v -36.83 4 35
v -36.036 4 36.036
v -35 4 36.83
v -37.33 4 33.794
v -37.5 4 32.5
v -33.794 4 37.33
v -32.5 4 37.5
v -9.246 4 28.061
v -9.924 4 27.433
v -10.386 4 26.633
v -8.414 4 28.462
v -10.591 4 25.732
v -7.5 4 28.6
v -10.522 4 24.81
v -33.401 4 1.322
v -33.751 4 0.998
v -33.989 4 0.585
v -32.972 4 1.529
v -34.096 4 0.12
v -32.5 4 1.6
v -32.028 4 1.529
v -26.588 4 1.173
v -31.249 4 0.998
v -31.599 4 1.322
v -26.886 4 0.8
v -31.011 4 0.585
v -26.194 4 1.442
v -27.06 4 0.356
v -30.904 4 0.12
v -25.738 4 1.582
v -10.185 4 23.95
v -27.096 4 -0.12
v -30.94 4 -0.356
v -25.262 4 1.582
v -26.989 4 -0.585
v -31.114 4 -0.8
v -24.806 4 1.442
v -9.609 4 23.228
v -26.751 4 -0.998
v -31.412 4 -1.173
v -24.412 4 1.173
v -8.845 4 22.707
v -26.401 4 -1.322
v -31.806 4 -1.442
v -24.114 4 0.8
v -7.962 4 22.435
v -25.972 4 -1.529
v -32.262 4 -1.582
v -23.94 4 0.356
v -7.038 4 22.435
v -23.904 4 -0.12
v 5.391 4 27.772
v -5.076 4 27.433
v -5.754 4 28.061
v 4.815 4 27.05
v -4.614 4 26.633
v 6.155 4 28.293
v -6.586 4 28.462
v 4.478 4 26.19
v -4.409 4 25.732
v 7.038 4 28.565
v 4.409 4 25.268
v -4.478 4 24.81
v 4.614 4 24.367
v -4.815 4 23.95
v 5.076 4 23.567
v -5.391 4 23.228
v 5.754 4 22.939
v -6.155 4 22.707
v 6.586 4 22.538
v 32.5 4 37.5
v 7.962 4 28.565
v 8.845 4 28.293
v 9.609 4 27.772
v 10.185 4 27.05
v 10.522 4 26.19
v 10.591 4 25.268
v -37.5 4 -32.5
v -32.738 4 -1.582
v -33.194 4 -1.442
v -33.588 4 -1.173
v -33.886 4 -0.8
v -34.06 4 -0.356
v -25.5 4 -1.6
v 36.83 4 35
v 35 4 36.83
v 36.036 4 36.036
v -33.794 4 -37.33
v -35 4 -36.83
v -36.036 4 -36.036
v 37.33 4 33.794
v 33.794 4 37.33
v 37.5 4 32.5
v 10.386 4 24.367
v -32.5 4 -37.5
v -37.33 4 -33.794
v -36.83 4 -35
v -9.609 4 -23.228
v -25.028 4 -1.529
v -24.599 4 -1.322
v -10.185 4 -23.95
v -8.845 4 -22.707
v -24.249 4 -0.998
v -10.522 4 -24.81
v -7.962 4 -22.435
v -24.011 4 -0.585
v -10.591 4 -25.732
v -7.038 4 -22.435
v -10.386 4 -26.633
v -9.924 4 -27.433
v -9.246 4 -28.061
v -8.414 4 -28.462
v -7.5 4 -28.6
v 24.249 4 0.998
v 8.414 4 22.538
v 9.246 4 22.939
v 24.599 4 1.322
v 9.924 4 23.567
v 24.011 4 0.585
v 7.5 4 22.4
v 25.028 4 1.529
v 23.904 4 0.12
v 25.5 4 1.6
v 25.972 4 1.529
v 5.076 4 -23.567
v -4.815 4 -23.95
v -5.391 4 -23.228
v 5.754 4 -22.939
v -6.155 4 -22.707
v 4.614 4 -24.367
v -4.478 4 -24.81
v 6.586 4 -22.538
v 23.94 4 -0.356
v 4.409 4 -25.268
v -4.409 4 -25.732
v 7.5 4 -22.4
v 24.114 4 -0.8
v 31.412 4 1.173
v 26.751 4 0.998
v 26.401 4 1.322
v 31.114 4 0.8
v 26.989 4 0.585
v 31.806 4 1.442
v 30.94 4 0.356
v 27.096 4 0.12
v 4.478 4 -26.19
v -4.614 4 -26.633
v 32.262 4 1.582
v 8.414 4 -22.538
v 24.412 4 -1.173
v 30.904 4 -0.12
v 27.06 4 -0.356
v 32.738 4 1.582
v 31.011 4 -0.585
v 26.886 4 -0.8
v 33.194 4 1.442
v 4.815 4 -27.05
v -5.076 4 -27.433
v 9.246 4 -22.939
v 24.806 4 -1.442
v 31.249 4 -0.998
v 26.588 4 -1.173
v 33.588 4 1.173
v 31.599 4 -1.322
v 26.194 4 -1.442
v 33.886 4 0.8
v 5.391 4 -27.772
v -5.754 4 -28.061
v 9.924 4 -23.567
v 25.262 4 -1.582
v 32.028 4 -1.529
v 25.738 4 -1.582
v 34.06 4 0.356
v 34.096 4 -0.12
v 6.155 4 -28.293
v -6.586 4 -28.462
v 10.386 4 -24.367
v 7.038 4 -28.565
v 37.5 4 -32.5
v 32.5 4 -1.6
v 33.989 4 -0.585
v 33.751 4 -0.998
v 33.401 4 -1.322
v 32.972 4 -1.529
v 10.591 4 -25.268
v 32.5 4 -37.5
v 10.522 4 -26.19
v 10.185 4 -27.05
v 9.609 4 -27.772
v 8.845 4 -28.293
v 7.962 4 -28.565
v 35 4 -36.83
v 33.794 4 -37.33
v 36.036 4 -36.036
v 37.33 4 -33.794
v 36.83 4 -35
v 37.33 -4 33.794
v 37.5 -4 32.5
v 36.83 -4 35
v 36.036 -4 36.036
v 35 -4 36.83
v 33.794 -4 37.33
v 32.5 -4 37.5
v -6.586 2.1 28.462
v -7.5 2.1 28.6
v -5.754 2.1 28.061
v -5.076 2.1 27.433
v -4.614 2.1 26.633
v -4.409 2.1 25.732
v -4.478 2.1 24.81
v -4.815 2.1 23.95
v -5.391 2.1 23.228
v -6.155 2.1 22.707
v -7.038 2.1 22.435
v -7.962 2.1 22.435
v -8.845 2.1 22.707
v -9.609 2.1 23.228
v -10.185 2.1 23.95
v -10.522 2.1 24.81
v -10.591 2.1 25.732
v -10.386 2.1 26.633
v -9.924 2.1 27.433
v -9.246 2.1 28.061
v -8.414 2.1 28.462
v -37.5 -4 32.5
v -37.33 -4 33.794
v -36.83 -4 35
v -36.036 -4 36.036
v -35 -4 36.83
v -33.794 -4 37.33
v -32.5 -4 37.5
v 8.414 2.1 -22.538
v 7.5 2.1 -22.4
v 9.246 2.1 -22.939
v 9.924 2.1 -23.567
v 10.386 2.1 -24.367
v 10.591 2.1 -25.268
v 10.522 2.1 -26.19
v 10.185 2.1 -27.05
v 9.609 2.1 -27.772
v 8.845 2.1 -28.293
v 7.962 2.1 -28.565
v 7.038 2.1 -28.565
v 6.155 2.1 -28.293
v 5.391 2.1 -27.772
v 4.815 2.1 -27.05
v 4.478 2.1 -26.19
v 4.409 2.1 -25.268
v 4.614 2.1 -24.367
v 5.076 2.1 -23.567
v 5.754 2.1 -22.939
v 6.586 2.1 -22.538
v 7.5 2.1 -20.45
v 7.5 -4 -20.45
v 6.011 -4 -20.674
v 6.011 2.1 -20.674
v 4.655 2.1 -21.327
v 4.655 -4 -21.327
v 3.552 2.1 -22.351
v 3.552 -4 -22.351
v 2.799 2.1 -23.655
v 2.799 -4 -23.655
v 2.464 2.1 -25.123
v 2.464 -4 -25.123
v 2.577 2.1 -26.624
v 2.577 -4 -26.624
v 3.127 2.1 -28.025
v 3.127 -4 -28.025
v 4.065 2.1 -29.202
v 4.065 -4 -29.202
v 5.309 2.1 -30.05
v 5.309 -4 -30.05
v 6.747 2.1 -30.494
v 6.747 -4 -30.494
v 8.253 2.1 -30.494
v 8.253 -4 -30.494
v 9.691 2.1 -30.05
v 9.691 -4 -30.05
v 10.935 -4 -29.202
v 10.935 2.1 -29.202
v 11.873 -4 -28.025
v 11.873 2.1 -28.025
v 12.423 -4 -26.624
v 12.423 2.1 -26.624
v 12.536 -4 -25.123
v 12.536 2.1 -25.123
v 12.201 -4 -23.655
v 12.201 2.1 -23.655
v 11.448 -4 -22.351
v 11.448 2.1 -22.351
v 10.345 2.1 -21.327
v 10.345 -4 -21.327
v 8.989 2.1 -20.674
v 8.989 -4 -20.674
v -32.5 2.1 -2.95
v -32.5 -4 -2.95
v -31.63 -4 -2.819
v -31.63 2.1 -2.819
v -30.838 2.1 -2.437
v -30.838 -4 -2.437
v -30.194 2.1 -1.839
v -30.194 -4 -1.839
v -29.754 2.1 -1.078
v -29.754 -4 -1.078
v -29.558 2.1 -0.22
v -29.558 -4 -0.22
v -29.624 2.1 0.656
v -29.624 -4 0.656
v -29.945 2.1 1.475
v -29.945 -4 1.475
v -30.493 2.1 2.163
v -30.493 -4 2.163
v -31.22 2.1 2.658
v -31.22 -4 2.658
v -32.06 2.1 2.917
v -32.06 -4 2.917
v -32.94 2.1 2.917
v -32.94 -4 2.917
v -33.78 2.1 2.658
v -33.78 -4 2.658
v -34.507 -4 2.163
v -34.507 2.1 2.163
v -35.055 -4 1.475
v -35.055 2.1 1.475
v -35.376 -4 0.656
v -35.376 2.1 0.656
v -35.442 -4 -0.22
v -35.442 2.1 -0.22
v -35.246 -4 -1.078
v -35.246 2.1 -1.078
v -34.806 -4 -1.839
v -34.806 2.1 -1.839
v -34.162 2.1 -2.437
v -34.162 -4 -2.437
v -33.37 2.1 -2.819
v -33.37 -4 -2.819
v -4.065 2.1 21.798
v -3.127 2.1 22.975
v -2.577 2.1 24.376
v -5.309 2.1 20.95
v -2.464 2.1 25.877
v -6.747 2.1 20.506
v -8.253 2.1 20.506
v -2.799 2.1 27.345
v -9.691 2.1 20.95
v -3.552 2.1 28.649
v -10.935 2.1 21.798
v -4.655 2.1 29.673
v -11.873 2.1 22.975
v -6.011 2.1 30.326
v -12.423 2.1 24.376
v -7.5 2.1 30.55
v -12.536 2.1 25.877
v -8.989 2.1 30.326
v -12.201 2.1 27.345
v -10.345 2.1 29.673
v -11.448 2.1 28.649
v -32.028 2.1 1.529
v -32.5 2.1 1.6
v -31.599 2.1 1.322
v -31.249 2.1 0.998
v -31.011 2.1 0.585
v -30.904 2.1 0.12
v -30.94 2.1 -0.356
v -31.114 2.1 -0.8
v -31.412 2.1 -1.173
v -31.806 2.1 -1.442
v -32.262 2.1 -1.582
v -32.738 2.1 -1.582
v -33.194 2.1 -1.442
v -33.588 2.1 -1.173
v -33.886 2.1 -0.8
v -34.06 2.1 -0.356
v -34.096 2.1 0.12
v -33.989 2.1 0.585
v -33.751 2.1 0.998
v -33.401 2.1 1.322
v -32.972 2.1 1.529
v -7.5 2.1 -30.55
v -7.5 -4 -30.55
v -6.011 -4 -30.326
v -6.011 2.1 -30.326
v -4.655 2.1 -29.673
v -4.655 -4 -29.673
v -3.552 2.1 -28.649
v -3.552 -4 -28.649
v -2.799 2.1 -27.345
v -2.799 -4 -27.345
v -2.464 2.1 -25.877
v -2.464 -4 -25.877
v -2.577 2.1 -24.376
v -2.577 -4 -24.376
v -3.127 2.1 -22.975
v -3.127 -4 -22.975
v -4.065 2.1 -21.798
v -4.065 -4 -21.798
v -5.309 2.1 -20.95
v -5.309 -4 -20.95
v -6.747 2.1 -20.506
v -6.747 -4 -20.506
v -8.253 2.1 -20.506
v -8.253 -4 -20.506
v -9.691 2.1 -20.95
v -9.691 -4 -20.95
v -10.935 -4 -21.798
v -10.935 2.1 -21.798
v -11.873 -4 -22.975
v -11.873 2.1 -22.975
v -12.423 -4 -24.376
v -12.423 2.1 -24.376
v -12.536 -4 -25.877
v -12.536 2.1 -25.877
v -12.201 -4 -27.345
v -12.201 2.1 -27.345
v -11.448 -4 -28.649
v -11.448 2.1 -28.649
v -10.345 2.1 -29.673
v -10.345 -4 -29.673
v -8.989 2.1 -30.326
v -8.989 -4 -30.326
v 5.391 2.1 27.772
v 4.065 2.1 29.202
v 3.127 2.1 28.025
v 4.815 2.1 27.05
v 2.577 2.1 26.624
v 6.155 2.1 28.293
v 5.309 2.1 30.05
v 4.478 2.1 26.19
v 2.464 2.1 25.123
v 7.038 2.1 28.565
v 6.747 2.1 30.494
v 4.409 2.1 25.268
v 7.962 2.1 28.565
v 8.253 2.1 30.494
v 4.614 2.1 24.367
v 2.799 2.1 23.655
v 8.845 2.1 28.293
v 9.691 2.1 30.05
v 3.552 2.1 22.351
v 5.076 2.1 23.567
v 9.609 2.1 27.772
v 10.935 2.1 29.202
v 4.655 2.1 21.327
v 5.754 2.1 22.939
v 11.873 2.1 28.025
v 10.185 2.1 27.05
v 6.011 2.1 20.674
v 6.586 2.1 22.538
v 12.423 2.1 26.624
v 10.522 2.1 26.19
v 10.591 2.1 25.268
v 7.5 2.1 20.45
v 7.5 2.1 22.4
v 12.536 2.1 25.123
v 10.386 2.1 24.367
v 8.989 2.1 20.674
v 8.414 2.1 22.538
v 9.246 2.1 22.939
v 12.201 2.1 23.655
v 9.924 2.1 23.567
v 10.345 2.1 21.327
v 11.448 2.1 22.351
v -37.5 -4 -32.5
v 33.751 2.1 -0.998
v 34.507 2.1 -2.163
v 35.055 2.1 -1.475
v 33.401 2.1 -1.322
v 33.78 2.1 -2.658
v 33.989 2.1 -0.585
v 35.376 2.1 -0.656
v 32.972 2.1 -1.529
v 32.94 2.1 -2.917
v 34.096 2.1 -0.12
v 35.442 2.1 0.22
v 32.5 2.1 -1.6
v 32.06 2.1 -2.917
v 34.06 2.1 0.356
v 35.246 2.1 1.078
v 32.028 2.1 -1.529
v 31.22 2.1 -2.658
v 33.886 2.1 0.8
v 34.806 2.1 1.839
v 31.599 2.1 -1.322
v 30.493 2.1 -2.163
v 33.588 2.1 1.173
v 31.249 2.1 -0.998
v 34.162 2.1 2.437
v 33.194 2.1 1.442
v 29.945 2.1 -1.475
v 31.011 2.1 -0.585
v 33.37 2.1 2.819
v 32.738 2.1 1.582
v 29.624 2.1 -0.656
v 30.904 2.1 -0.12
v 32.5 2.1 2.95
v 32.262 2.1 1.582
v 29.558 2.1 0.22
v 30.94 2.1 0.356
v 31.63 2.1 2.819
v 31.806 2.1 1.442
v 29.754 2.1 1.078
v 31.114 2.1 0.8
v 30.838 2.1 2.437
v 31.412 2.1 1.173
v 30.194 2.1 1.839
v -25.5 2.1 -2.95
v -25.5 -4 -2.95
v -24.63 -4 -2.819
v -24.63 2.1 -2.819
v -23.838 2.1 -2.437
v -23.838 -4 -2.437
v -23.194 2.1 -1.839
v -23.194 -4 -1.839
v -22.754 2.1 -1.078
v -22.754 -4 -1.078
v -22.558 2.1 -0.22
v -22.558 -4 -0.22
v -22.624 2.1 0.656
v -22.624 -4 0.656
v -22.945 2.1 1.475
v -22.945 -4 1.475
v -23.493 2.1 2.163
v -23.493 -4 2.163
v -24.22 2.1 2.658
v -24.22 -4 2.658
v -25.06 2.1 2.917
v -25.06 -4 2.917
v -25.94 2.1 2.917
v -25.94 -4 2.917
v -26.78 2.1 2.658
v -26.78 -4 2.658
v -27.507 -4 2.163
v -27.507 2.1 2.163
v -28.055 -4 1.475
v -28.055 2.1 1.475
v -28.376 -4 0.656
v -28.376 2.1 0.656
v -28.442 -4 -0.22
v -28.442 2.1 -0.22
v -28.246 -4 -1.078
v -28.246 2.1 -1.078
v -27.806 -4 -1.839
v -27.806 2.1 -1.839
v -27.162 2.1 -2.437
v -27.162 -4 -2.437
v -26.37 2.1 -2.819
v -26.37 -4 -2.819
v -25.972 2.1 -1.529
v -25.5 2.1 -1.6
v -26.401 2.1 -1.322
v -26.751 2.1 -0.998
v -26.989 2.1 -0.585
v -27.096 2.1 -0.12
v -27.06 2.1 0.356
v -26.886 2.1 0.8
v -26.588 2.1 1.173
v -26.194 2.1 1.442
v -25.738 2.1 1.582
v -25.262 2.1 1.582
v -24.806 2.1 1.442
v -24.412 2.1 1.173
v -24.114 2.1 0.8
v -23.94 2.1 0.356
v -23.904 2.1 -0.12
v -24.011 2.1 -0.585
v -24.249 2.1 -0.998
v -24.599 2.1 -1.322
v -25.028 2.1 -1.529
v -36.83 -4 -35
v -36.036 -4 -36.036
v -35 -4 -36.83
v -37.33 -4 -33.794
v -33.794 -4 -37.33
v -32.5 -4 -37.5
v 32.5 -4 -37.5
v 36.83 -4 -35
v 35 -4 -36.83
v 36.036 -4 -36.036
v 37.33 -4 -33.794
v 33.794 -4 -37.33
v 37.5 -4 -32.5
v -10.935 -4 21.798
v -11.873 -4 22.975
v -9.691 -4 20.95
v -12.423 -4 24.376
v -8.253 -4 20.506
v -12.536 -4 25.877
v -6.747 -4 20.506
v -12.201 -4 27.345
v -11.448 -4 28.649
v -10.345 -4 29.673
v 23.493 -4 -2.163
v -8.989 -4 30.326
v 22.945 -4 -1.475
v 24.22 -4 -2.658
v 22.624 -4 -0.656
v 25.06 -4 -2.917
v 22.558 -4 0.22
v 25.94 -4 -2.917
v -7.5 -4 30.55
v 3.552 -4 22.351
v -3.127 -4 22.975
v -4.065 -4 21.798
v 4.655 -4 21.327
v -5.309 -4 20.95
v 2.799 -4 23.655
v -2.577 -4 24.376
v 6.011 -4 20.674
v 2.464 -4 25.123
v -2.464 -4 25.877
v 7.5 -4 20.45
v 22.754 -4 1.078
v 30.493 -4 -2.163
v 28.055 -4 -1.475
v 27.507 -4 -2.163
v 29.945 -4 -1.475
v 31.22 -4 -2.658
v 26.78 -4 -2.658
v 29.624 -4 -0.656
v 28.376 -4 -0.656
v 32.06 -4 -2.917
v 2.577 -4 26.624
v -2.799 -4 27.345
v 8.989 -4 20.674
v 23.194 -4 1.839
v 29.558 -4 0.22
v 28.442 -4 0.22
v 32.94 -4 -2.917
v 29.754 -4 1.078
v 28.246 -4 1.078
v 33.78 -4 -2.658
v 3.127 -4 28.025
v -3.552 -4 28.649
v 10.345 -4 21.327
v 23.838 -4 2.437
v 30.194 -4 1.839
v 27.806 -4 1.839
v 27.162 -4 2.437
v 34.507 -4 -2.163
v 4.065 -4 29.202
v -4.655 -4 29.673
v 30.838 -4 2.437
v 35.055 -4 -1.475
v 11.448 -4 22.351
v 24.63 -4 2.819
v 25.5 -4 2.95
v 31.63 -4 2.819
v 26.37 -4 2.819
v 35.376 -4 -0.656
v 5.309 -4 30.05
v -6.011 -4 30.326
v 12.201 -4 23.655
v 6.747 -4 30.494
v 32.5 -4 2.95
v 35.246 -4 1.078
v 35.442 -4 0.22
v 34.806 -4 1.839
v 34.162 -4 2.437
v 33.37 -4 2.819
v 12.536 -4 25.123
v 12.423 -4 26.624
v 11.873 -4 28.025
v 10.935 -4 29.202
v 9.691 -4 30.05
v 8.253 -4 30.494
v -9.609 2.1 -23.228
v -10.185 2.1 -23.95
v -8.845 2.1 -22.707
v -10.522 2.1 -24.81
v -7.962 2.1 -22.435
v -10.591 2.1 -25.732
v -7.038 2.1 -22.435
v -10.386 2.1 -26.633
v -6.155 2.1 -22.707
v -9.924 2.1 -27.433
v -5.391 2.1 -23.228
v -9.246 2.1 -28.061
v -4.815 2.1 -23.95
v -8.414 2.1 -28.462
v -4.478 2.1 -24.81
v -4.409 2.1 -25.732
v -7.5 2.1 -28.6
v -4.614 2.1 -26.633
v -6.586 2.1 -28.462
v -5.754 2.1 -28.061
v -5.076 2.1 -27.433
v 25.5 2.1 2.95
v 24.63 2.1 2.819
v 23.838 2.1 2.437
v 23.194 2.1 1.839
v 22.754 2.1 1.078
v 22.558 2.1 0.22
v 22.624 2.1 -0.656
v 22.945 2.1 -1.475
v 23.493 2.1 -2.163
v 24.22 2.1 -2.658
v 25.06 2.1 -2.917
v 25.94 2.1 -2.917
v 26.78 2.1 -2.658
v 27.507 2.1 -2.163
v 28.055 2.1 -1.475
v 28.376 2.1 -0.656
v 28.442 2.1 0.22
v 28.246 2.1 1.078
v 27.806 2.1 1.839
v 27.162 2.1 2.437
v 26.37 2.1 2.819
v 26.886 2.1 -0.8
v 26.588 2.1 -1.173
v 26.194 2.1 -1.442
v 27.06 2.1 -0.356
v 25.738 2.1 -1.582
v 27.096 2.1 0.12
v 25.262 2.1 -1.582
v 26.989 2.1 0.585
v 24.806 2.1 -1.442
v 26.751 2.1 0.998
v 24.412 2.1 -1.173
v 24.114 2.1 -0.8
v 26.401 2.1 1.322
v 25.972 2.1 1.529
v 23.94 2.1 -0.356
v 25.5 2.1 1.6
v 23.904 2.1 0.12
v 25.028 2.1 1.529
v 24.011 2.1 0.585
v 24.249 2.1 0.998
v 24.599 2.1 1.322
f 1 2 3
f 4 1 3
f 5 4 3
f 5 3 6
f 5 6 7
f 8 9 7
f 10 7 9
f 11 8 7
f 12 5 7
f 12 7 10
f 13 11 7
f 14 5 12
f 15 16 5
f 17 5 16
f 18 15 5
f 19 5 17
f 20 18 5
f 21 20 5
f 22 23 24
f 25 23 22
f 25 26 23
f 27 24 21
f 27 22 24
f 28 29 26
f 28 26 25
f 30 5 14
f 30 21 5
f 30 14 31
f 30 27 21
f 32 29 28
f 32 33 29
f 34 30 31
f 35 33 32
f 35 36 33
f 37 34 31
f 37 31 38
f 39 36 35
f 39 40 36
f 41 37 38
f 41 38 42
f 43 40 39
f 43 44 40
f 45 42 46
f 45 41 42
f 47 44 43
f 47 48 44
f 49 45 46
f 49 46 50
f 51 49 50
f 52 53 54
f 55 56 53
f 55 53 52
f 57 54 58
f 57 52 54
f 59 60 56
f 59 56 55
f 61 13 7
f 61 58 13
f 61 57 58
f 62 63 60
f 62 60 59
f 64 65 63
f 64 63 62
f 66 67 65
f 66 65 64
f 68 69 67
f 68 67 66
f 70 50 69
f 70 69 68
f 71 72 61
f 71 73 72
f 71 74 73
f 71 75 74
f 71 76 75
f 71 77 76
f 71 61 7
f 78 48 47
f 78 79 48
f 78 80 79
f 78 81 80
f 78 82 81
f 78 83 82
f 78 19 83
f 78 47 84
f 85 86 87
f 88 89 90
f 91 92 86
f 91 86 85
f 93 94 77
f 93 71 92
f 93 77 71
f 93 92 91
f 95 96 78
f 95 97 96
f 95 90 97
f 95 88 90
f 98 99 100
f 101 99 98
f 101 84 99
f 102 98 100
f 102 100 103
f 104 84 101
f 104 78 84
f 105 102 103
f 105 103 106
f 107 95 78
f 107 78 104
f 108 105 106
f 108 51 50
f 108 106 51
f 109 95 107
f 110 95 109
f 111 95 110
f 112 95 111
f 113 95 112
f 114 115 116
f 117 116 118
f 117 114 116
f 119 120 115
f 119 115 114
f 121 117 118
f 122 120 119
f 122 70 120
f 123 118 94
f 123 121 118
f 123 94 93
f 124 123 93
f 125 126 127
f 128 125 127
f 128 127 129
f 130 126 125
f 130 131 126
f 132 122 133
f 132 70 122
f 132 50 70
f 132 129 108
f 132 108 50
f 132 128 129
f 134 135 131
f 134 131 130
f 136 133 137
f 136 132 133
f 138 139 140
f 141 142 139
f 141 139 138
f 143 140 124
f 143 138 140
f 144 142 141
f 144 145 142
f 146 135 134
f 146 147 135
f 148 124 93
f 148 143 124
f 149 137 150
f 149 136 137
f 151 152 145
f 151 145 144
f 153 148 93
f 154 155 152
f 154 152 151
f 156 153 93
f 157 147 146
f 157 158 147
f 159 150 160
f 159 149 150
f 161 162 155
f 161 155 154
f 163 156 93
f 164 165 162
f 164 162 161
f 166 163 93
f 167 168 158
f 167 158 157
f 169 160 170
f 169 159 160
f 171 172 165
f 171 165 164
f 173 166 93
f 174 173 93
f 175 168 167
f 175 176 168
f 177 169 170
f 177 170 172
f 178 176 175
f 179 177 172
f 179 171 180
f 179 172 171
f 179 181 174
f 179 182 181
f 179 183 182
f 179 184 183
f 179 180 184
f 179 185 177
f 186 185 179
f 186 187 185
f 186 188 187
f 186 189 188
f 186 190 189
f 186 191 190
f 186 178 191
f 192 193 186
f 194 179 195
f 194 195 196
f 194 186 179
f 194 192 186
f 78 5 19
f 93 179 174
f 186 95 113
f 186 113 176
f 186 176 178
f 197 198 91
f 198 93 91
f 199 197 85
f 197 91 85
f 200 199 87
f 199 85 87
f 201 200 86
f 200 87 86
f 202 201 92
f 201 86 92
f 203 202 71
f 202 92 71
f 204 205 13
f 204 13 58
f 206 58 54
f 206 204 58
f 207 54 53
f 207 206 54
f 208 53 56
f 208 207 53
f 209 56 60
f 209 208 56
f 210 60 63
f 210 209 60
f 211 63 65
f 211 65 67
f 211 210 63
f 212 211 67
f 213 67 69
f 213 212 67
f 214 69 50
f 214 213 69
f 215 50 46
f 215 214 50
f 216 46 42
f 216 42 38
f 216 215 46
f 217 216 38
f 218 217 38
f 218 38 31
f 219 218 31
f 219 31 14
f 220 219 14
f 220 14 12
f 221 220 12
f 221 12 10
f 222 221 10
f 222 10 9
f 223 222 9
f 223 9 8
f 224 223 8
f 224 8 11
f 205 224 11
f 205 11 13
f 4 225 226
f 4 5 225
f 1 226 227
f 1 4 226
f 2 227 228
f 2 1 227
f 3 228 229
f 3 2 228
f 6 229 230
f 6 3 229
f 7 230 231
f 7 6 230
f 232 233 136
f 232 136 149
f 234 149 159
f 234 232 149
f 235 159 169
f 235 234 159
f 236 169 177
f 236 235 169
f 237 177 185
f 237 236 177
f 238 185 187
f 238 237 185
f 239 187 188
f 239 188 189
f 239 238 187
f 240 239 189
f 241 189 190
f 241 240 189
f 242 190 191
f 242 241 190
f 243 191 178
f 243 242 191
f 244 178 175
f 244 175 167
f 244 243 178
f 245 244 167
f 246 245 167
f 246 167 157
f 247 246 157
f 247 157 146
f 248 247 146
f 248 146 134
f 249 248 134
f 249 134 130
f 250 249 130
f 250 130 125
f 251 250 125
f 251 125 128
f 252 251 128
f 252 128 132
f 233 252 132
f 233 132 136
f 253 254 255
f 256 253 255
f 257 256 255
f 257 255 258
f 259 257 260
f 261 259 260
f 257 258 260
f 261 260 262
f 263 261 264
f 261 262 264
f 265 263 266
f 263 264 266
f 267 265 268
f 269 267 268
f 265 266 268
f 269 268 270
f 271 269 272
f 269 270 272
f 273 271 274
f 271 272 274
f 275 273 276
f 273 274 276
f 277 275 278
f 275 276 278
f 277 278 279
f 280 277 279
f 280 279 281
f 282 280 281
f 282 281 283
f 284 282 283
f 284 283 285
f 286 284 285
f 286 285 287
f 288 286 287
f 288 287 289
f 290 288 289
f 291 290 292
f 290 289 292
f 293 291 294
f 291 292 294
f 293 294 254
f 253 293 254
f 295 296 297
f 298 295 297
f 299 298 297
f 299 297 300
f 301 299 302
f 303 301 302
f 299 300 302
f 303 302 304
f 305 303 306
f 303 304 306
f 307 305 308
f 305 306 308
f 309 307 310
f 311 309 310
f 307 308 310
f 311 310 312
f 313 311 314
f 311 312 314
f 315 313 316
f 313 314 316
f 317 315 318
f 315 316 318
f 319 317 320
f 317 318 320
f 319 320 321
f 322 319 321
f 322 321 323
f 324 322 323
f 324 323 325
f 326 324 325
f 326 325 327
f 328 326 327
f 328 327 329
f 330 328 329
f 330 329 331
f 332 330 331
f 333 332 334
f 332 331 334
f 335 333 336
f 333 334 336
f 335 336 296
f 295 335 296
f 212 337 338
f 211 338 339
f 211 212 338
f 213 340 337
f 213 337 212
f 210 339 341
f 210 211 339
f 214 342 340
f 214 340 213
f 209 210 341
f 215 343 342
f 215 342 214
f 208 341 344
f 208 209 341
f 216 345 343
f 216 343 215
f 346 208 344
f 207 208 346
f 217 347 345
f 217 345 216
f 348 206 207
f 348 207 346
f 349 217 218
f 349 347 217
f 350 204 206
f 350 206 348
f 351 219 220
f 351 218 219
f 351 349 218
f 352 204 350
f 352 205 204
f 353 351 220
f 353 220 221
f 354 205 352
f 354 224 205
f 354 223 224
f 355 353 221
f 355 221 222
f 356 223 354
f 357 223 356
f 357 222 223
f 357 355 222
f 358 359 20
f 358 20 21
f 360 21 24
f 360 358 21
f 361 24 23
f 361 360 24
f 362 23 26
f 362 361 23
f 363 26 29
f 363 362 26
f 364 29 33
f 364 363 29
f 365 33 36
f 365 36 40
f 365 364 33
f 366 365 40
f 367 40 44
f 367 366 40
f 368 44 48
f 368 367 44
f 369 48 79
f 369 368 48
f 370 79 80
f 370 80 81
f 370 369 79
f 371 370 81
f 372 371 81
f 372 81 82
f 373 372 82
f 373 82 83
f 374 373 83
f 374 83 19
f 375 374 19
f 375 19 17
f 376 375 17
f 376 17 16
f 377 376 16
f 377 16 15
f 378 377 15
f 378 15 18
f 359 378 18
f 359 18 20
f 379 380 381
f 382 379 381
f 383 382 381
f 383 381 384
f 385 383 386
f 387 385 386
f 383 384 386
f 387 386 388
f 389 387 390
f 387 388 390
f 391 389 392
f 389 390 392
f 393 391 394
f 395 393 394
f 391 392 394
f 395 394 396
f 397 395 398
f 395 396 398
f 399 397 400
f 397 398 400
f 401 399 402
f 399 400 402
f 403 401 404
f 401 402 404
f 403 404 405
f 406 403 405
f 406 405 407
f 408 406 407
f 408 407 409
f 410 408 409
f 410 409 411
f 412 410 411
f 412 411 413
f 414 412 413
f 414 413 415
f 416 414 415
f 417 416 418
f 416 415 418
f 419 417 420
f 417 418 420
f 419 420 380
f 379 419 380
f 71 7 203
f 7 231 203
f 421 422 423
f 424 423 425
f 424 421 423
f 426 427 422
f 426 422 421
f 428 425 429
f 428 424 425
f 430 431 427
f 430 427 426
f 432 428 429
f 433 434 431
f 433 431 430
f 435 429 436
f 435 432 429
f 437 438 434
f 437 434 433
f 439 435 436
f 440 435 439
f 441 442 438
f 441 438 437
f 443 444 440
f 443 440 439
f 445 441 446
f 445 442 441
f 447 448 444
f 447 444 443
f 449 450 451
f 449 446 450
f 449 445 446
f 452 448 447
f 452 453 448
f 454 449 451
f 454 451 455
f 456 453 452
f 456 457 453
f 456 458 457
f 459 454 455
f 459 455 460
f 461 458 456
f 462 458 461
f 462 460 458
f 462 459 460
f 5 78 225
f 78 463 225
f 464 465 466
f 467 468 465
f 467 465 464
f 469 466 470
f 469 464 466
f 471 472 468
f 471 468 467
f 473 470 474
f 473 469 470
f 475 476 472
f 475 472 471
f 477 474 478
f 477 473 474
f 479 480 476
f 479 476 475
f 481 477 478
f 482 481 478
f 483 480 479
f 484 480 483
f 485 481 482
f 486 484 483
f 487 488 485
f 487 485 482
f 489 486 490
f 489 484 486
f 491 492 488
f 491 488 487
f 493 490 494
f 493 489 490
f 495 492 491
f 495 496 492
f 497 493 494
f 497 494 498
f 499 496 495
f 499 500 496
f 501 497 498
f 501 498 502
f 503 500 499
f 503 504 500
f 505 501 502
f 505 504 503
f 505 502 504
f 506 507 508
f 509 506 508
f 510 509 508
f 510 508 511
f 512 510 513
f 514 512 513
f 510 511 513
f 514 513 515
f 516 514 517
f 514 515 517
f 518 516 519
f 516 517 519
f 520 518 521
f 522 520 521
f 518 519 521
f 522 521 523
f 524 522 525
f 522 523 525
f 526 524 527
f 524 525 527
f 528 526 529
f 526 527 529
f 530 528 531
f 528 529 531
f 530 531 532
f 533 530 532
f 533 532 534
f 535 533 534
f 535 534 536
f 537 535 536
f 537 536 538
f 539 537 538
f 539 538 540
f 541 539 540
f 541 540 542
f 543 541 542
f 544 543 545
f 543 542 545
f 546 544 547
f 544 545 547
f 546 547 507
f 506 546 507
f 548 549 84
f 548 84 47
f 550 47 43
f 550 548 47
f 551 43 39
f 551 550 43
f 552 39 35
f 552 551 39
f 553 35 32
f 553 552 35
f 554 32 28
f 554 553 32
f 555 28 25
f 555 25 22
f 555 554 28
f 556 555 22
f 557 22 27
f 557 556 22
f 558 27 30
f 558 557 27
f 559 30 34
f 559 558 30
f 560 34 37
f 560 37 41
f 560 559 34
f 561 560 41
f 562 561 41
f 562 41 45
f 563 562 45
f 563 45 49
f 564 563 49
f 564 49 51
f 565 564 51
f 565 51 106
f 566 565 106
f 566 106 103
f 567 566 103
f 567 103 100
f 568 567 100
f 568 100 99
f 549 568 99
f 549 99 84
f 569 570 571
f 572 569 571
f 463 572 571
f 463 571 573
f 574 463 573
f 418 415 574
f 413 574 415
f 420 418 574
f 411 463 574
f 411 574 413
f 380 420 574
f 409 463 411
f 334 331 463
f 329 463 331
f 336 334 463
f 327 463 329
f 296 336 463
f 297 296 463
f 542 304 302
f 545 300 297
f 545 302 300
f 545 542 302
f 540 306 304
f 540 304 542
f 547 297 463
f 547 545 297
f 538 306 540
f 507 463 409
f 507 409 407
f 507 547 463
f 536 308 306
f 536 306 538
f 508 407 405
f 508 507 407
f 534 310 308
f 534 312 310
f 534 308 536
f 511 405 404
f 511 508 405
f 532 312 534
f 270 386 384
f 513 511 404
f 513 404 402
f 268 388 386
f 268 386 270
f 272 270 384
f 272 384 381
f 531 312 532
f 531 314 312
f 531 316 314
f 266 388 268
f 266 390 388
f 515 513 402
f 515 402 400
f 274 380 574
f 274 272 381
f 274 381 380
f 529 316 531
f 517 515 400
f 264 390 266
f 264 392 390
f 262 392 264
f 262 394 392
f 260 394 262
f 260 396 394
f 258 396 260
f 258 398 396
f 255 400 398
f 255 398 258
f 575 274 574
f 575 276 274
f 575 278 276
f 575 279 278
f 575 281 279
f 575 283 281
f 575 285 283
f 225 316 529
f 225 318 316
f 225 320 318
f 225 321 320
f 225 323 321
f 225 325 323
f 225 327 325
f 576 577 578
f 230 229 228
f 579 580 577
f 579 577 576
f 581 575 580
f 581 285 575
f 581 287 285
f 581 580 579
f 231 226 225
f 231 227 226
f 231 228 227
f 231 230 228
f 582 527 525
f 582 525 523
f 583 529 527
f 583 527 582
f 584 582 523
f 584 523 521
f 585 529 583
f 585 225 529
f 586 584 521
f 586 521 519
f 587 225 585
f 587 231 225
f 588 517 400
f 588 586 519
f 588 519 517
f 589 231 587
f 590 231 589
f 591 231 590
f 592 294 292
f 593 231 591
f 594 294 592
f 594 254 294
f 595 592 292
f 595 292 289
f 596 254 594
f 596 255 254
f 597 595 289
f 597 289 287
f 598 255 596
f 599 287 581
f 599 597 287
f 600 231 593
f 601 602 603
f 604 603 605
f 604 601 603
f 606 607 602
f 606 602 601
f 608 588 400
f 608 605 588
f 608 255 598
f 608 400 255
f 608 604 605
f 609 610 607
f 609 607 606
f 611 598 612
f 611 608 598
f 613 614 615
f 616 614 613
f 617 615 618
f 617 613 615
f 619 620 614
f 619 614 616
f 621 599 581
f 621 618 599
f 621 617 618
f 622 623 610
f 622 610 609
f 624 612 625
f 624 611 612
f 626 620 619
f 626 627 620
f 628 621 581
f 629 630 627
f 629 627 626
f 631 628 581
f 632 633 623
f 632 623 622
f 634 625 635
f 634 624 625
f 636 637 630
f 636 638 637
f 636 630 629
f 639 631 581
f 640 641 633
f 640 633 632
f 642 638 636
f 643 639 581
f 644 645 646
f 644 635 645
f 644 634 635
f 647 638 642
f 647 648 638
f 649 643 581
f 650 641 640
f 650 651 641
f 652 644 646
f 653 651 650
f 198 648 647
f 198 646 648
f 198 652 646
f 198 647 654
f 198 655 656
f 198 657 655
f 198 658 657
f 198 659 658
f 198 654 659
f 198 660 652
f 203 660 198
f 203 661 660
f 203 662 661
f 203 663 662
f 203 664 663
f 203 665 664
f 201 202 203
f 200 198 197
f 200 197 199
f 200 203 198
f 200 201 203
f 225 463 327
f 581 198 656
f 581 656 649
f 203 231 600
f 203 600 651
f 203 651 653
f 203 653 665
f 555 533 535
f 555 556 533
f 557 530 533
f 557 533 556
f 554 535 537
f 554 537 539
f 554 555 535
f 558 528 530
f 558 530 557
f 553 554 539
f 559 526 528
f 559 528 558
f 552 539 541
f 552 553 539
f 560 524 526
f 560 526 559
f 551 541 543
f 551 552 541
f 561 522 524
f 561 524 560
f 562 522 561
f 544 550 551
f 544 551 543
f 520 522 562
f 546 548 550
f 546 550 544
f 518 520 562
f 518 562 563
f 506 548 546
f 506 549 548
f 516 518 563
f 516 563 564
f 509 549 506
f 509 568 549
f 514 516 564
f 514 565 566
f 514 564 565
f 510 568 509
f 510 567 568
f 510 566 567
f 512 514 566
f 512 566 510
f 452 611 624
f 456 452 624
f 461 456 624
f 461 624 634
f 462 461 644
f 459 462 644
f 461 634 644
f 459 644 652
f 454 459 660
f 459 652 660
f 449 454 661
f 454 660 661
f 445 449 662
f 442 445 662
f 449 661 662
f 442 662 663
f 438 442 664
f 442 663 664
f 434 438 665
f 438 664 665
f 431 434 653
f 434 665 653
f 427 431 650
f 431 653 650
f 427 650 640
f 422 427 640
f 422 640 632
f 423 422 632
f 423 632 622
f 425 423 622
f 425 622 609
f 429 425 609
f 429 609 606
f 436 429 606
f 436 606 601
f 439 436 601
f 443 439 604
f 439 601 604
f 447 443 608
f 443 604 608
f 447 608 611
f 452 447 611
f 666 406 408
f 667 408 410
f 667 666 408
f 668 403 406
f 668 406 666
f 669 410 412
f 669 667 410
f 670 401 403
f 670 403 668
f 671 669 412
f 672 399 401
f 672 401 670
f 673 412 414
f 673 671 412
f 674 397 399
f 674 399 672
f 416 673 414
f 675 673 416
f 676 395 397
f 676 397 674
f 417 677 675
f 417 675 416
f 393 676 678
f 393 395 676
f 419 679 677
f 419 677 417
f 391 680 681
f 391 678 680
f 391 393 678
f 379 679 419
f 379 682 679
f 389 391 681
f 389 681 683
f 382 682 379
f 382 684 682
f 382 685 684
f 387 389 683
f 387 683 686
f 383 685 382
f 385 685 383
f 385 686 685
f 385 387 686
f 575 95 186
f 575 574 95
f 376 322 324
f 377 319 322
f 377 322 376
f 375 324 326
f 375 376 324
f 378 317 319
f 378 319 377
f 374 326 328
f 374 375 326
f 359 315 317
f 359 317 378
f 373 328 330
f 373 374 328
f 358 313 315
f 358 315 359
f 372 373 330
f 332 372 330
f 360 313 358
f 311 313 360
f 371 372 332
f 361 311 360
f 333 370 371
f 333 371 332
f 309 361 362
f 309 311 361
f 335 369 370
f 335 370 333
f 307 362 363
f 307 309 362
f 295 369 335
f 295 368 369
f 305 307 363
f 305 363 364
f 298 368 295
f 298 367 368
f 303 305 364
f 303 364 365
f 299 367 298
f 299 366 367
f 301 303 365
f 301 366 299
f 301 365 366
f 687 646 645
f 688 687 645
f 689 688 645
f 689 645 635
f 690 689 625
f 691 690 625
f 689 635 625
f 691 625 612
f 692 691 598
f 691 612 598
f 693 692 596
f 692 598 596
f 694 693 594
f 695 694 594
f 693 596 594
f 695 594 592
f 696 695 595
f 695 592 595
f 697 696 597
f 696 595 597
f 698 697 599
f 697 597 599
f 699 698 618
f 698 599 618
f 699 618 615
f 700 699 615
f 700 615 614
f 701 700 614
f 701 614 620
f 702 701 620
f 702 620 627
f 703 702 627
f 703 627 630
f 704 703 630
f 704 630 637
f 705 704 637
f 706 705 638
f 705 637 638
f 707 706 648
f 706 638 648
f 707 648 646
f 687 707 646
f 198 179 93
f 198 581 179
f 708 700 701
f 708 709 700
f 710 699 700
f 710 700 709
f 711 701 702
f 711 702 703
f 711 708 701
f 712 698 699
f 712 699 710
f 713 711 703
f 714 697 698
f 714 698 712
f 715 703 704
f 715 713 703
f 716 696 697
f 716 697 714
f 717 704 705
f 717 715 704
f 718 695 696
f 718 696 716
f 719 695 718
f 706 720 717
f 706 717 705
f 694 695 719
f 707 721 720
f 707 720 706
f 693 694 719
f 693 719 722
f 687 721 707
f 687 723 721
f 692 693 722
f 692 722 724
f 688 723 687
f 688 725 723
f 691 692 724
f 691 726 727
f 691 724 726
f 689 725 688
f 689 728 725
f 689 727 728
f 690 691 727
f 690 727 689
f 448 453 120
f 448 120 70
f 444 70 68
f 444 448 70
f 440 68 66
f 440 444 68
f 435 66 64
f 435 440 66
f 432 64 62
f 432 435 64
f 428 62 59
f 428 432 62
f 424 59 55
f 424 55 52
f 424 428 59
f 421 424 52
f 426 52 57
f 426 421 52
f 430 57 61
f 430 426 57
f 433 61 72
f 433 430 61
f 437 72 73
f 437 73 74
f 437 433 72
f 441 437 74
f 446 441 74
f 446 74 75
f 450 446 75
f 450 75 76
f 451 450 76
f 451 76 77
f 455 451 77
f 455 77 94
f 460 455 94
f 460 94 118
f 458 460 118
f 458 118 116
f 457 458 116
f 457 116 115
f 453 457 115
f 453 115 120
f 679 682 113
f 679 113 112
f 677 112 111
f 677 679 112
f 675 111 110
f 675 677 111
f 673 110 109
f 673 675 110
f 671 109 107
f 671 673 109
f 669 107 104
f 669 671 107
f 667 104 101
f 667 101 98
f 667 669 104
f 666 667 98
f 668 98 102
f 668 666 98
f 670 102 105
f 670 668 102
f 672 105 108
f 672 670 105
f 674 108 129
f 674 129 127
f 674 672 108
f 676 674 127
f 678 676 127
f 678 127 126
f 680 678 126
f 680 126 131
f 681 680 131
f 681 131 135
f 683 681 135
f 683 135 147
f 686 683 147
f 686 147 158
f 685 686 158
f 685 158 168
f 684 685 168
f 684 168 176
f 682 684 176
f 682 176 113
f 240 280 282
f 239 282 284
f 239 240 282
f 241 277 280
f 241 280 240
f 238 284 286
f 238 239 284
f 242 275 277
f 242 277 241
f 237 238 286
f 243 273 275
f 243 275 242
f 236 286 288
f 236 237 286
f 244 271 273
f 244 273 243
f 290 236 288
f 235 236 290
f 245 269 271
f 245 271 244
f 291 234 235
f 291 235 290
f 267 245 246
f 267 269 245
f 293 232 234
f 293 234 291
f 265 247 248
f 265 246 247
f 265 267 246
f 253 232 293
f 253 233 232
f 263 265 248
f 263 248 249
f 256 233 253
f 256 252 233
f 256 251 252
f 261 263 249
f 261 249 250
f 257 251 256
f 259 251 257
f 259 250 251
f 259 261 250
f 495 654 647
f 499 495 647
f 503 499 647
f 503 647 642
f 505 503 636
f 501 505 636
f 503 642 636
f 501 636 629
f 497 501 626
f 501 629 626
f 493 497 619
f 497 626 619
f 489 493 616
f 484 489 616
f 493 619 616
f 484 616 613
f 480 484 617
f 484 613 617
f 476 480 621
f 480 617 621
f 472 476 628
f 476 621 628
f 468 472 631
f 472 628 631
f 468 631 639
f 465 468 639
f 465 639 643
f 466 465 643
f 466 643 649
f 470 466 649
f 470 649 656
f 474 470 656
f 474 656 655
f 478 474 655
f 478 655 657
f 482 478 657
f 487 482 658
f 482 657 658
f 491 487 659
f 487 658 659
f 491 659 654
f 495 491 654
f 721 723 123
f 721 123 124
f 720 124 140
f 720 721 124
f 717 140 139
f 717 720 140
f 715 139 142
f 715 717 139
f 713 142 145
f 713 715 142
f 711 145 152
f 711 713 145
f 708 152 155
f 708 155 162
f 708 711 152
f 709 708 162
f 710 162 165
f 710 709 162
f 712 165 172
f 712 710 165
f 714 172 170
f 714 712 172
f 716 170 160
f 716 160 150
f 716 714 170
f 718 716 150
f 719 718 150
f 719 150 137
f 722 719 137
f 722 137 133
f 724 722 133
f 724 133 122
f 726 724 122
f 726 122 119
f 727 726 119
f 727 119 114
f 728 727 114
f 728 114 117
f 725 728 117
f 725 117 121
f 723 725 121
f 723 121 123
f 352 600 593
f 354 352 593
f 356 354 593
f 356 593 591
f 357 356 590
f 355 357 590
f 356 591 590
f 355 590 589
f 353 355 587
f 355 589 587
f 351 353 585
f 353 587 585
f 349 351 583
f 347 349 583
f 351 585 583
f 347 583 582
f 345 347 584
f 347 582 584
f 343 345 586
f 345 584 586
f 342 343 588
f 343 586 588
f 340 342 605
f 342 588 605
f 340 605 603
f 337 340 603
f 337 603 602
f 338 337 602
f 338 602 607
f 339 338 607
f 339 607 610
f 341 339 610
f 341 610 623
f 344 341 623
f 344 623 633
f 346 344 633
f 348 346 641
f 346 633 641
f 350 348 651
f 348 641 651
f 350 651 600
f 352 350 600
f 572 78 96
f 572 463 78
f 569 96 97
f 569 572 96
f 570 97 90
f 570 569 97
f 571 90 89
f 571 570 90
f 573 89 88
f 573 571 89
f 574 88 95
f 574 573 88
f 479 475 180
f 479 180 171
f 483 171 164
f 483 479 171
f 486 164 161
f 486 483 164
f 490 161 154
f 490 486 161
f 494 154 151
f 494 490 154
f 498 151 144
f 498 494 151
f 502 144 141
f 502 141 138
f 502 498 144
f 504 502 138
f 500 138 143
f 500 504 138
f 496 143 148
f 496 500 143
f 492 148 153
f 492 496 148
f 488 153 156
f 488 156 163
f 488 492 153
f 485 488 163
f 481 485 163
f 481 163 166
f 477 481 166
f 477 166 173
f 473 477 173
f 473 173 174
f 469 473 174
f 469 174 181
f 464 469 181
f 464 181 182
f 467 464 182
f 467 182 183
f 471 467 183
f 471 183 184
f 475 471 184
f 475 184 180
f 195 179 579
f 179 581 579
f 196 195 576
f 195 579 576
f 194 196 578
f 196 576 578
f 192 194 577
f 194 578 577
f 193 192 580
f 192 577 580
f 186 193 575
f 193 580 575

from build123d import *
from build123d.topology import SkipClean

# Parameters (mm, degrees)
SKETCH1_W           = 75
SKETCH1_H           = 75
SKETCH1_R           = 1.6
SKETCH1_R_2         = 3.1
BOSS_EXTRUDE1_DEPTH = 4
BOSS_EXTRUDE2_START = 4
SKETCH3_W           = 75
SKETCH3_H           = 75
SKETCH3_R           = 3.1
SKETCH3_R_2         = 1.6
BOSS_EXTRUDE2_DEPTH = 4
SKETCH5_R           = 5.05
SKETCH5_R_2         = 2.95
CUT_EXTRUDE1_DEPTH  = 6.1
FILLET2_R           = 5


with BuildPart() as part:
    # Sketch1 → Boss-Extrude1 (new body)
    with BuildSketch(Plane(origin=(0, 0, 0), x_dir=(1, 0, 0), z_dir=(0, 1, 0))):
        Rectangle(SKETCH1_W, SKETCH1_H)
        with Locations(Location((-32.5, 0, 0), (0, 0, 270))):
            Circle(SKETCH1_R, mode=Mode.SUBTRACT)
        with Locations(Location((-25.5, 0, 0), (0, 0, 90))):
            Circle(SKETCH1_R, mode=Mode.SUBTRACT)
        with Locations(Location((25.5, 0, 0), (0, 0, 270))):
            Circle(SKETCH1_R, mode=Mode.SUBTRACT)
        with Locations(Location((32.5, 0, 0), (0, 0, 90))):
            Circle(SKETCH1_R, mode=Mode.SUBTRACT)
        with Locations(Location((-7.5, -25.5, 0), (0, 0, 270))):
            Circle(SKETCH1_R_2, mode=Mode.SUBTRACT)
        with Locations(Location((7.5, -25.5, 0), (0, 0, 90))):
            Circle(SKETCH1_R_2, mode=Mode.SUBTRACT)
        with Locations(Location((7.5, 25.5, 0), (0, 0, 270))):
            Circle(SKETCH1_R_2, mode=Mode.SUBTRACT)
        with Locations(Location((-7.5, 25.5, 0), (0, 0, 90))):
            Circle(SKETCH1_R_2, mode=Mode.SUBTRACT)
    extrude(amount=BOSS_EXTRUDE1_DEPTH)

    # Sketch3 → Boss-Extrude2 (add)
    with SkipClean():  # the faces are left unmerged after this step: merging them gives an invalid solid
        with BuildSketch(Plane.XZ.offset(BOSS_EXTRUDE2_START)):
            Rectangle(SKETCH3_W, SKETCH3_H)
            with Locations(Location((-7.5, -25.5, 0), (0, 0, 270))):
                Circle(SKETCH3_R, mode=Mode.SUBTRACT)
            with Locations(Location((7.5, -25.5, 0), (0, 0, 270))):
                Circle(SKETCH3_R, mode=Mode.SUBTRACT)
            with Locations(Location((32.5, 0, 0), (0, 0, 270))):
                Circle(SKETCH3_R_2, mode=Mode.SUBTRACT)
            with Locations(Location((25.5, 0, 0), (0, 0, 270))):
                Circle(SKETCH3_R_2, mode=Mode.SUBTRACT)
            with Locations(Location((7.5, 25.5, 0), (0, 0, 270))):
                Circle(SKETCH3_R, mode=Mode.SUBTRACT)
            with Locations(Location((-7.5, 25.5, 0), (0, 0, 270))):
                Circle(SKETCH3_R, mode=Mode.SUBTRACT)
            with Locations(Location((-25.5, 0, 0), (0, 0, 270))):
                Circle(SKETCH3_R_2, mode=Mode.SUBTRACT)
            with Locations(Location((-32.5, 0, 0), (0, 0, 270))):
                Circle(SKETCH3_R_2, mode=Mode.SUBTRACT)
        extrude(amount=-BOSS_EXTRUDE2_DEPTH)

    # Sketch5 → Cut-Extrude1 (cut)
    with BuildSketch(Plane.XZ.offset(4)):
        with Locations(Location((-7.5, -25.5, 0), (0, 0, 270))):
            Circle(SKETCH5_R)
        with Locations(Location((7.5, -25.5, 0), (0, 0, 90))):
            Circle(SKETCH5_R)
        with Locations(Location((7.5, 25.5, 0), (0, 0, 270))):
            Circle(SKETCH5_R)
        with Locations(Location((-7.5, 25.5, 0), (0, 0, 90))):
            Circle(SKETCH5_R)
        with Locations(Location((-32.5, 0, 0), (0, 0, 270))):
            Circle(SKETCH5_R_2)
        with Locations(Location((-25.5, 0, 0), (0, 0, 270))):
            Circle(SKETCH5_R_2)
        with Locations(Location((25.5, 0, 0), (0, 0, 90))):
            Circle(SKETCH5_R_2)
        with Locations(Location((32.5, 0, 0), (0, 0, 90))):
            Circle(SKETCH5_R_2)
    extrude(amount=-CUT_EXTRUDE1_DEPTH, mode=Mode.SUBTRACT)

    # Fillet2
    fillet2_edges = [part.edges().sort_by_distance(p)[0] for p in [
        (-37.5, 0, -37.5),
        (37.5, 0, -37.5),
        (37.5, 0, 37.5),
        (-37.5, 0, 37.5),
    ]]
    fillet(fillet2_edges, radius=FILLET2_R)


solid = part.part
